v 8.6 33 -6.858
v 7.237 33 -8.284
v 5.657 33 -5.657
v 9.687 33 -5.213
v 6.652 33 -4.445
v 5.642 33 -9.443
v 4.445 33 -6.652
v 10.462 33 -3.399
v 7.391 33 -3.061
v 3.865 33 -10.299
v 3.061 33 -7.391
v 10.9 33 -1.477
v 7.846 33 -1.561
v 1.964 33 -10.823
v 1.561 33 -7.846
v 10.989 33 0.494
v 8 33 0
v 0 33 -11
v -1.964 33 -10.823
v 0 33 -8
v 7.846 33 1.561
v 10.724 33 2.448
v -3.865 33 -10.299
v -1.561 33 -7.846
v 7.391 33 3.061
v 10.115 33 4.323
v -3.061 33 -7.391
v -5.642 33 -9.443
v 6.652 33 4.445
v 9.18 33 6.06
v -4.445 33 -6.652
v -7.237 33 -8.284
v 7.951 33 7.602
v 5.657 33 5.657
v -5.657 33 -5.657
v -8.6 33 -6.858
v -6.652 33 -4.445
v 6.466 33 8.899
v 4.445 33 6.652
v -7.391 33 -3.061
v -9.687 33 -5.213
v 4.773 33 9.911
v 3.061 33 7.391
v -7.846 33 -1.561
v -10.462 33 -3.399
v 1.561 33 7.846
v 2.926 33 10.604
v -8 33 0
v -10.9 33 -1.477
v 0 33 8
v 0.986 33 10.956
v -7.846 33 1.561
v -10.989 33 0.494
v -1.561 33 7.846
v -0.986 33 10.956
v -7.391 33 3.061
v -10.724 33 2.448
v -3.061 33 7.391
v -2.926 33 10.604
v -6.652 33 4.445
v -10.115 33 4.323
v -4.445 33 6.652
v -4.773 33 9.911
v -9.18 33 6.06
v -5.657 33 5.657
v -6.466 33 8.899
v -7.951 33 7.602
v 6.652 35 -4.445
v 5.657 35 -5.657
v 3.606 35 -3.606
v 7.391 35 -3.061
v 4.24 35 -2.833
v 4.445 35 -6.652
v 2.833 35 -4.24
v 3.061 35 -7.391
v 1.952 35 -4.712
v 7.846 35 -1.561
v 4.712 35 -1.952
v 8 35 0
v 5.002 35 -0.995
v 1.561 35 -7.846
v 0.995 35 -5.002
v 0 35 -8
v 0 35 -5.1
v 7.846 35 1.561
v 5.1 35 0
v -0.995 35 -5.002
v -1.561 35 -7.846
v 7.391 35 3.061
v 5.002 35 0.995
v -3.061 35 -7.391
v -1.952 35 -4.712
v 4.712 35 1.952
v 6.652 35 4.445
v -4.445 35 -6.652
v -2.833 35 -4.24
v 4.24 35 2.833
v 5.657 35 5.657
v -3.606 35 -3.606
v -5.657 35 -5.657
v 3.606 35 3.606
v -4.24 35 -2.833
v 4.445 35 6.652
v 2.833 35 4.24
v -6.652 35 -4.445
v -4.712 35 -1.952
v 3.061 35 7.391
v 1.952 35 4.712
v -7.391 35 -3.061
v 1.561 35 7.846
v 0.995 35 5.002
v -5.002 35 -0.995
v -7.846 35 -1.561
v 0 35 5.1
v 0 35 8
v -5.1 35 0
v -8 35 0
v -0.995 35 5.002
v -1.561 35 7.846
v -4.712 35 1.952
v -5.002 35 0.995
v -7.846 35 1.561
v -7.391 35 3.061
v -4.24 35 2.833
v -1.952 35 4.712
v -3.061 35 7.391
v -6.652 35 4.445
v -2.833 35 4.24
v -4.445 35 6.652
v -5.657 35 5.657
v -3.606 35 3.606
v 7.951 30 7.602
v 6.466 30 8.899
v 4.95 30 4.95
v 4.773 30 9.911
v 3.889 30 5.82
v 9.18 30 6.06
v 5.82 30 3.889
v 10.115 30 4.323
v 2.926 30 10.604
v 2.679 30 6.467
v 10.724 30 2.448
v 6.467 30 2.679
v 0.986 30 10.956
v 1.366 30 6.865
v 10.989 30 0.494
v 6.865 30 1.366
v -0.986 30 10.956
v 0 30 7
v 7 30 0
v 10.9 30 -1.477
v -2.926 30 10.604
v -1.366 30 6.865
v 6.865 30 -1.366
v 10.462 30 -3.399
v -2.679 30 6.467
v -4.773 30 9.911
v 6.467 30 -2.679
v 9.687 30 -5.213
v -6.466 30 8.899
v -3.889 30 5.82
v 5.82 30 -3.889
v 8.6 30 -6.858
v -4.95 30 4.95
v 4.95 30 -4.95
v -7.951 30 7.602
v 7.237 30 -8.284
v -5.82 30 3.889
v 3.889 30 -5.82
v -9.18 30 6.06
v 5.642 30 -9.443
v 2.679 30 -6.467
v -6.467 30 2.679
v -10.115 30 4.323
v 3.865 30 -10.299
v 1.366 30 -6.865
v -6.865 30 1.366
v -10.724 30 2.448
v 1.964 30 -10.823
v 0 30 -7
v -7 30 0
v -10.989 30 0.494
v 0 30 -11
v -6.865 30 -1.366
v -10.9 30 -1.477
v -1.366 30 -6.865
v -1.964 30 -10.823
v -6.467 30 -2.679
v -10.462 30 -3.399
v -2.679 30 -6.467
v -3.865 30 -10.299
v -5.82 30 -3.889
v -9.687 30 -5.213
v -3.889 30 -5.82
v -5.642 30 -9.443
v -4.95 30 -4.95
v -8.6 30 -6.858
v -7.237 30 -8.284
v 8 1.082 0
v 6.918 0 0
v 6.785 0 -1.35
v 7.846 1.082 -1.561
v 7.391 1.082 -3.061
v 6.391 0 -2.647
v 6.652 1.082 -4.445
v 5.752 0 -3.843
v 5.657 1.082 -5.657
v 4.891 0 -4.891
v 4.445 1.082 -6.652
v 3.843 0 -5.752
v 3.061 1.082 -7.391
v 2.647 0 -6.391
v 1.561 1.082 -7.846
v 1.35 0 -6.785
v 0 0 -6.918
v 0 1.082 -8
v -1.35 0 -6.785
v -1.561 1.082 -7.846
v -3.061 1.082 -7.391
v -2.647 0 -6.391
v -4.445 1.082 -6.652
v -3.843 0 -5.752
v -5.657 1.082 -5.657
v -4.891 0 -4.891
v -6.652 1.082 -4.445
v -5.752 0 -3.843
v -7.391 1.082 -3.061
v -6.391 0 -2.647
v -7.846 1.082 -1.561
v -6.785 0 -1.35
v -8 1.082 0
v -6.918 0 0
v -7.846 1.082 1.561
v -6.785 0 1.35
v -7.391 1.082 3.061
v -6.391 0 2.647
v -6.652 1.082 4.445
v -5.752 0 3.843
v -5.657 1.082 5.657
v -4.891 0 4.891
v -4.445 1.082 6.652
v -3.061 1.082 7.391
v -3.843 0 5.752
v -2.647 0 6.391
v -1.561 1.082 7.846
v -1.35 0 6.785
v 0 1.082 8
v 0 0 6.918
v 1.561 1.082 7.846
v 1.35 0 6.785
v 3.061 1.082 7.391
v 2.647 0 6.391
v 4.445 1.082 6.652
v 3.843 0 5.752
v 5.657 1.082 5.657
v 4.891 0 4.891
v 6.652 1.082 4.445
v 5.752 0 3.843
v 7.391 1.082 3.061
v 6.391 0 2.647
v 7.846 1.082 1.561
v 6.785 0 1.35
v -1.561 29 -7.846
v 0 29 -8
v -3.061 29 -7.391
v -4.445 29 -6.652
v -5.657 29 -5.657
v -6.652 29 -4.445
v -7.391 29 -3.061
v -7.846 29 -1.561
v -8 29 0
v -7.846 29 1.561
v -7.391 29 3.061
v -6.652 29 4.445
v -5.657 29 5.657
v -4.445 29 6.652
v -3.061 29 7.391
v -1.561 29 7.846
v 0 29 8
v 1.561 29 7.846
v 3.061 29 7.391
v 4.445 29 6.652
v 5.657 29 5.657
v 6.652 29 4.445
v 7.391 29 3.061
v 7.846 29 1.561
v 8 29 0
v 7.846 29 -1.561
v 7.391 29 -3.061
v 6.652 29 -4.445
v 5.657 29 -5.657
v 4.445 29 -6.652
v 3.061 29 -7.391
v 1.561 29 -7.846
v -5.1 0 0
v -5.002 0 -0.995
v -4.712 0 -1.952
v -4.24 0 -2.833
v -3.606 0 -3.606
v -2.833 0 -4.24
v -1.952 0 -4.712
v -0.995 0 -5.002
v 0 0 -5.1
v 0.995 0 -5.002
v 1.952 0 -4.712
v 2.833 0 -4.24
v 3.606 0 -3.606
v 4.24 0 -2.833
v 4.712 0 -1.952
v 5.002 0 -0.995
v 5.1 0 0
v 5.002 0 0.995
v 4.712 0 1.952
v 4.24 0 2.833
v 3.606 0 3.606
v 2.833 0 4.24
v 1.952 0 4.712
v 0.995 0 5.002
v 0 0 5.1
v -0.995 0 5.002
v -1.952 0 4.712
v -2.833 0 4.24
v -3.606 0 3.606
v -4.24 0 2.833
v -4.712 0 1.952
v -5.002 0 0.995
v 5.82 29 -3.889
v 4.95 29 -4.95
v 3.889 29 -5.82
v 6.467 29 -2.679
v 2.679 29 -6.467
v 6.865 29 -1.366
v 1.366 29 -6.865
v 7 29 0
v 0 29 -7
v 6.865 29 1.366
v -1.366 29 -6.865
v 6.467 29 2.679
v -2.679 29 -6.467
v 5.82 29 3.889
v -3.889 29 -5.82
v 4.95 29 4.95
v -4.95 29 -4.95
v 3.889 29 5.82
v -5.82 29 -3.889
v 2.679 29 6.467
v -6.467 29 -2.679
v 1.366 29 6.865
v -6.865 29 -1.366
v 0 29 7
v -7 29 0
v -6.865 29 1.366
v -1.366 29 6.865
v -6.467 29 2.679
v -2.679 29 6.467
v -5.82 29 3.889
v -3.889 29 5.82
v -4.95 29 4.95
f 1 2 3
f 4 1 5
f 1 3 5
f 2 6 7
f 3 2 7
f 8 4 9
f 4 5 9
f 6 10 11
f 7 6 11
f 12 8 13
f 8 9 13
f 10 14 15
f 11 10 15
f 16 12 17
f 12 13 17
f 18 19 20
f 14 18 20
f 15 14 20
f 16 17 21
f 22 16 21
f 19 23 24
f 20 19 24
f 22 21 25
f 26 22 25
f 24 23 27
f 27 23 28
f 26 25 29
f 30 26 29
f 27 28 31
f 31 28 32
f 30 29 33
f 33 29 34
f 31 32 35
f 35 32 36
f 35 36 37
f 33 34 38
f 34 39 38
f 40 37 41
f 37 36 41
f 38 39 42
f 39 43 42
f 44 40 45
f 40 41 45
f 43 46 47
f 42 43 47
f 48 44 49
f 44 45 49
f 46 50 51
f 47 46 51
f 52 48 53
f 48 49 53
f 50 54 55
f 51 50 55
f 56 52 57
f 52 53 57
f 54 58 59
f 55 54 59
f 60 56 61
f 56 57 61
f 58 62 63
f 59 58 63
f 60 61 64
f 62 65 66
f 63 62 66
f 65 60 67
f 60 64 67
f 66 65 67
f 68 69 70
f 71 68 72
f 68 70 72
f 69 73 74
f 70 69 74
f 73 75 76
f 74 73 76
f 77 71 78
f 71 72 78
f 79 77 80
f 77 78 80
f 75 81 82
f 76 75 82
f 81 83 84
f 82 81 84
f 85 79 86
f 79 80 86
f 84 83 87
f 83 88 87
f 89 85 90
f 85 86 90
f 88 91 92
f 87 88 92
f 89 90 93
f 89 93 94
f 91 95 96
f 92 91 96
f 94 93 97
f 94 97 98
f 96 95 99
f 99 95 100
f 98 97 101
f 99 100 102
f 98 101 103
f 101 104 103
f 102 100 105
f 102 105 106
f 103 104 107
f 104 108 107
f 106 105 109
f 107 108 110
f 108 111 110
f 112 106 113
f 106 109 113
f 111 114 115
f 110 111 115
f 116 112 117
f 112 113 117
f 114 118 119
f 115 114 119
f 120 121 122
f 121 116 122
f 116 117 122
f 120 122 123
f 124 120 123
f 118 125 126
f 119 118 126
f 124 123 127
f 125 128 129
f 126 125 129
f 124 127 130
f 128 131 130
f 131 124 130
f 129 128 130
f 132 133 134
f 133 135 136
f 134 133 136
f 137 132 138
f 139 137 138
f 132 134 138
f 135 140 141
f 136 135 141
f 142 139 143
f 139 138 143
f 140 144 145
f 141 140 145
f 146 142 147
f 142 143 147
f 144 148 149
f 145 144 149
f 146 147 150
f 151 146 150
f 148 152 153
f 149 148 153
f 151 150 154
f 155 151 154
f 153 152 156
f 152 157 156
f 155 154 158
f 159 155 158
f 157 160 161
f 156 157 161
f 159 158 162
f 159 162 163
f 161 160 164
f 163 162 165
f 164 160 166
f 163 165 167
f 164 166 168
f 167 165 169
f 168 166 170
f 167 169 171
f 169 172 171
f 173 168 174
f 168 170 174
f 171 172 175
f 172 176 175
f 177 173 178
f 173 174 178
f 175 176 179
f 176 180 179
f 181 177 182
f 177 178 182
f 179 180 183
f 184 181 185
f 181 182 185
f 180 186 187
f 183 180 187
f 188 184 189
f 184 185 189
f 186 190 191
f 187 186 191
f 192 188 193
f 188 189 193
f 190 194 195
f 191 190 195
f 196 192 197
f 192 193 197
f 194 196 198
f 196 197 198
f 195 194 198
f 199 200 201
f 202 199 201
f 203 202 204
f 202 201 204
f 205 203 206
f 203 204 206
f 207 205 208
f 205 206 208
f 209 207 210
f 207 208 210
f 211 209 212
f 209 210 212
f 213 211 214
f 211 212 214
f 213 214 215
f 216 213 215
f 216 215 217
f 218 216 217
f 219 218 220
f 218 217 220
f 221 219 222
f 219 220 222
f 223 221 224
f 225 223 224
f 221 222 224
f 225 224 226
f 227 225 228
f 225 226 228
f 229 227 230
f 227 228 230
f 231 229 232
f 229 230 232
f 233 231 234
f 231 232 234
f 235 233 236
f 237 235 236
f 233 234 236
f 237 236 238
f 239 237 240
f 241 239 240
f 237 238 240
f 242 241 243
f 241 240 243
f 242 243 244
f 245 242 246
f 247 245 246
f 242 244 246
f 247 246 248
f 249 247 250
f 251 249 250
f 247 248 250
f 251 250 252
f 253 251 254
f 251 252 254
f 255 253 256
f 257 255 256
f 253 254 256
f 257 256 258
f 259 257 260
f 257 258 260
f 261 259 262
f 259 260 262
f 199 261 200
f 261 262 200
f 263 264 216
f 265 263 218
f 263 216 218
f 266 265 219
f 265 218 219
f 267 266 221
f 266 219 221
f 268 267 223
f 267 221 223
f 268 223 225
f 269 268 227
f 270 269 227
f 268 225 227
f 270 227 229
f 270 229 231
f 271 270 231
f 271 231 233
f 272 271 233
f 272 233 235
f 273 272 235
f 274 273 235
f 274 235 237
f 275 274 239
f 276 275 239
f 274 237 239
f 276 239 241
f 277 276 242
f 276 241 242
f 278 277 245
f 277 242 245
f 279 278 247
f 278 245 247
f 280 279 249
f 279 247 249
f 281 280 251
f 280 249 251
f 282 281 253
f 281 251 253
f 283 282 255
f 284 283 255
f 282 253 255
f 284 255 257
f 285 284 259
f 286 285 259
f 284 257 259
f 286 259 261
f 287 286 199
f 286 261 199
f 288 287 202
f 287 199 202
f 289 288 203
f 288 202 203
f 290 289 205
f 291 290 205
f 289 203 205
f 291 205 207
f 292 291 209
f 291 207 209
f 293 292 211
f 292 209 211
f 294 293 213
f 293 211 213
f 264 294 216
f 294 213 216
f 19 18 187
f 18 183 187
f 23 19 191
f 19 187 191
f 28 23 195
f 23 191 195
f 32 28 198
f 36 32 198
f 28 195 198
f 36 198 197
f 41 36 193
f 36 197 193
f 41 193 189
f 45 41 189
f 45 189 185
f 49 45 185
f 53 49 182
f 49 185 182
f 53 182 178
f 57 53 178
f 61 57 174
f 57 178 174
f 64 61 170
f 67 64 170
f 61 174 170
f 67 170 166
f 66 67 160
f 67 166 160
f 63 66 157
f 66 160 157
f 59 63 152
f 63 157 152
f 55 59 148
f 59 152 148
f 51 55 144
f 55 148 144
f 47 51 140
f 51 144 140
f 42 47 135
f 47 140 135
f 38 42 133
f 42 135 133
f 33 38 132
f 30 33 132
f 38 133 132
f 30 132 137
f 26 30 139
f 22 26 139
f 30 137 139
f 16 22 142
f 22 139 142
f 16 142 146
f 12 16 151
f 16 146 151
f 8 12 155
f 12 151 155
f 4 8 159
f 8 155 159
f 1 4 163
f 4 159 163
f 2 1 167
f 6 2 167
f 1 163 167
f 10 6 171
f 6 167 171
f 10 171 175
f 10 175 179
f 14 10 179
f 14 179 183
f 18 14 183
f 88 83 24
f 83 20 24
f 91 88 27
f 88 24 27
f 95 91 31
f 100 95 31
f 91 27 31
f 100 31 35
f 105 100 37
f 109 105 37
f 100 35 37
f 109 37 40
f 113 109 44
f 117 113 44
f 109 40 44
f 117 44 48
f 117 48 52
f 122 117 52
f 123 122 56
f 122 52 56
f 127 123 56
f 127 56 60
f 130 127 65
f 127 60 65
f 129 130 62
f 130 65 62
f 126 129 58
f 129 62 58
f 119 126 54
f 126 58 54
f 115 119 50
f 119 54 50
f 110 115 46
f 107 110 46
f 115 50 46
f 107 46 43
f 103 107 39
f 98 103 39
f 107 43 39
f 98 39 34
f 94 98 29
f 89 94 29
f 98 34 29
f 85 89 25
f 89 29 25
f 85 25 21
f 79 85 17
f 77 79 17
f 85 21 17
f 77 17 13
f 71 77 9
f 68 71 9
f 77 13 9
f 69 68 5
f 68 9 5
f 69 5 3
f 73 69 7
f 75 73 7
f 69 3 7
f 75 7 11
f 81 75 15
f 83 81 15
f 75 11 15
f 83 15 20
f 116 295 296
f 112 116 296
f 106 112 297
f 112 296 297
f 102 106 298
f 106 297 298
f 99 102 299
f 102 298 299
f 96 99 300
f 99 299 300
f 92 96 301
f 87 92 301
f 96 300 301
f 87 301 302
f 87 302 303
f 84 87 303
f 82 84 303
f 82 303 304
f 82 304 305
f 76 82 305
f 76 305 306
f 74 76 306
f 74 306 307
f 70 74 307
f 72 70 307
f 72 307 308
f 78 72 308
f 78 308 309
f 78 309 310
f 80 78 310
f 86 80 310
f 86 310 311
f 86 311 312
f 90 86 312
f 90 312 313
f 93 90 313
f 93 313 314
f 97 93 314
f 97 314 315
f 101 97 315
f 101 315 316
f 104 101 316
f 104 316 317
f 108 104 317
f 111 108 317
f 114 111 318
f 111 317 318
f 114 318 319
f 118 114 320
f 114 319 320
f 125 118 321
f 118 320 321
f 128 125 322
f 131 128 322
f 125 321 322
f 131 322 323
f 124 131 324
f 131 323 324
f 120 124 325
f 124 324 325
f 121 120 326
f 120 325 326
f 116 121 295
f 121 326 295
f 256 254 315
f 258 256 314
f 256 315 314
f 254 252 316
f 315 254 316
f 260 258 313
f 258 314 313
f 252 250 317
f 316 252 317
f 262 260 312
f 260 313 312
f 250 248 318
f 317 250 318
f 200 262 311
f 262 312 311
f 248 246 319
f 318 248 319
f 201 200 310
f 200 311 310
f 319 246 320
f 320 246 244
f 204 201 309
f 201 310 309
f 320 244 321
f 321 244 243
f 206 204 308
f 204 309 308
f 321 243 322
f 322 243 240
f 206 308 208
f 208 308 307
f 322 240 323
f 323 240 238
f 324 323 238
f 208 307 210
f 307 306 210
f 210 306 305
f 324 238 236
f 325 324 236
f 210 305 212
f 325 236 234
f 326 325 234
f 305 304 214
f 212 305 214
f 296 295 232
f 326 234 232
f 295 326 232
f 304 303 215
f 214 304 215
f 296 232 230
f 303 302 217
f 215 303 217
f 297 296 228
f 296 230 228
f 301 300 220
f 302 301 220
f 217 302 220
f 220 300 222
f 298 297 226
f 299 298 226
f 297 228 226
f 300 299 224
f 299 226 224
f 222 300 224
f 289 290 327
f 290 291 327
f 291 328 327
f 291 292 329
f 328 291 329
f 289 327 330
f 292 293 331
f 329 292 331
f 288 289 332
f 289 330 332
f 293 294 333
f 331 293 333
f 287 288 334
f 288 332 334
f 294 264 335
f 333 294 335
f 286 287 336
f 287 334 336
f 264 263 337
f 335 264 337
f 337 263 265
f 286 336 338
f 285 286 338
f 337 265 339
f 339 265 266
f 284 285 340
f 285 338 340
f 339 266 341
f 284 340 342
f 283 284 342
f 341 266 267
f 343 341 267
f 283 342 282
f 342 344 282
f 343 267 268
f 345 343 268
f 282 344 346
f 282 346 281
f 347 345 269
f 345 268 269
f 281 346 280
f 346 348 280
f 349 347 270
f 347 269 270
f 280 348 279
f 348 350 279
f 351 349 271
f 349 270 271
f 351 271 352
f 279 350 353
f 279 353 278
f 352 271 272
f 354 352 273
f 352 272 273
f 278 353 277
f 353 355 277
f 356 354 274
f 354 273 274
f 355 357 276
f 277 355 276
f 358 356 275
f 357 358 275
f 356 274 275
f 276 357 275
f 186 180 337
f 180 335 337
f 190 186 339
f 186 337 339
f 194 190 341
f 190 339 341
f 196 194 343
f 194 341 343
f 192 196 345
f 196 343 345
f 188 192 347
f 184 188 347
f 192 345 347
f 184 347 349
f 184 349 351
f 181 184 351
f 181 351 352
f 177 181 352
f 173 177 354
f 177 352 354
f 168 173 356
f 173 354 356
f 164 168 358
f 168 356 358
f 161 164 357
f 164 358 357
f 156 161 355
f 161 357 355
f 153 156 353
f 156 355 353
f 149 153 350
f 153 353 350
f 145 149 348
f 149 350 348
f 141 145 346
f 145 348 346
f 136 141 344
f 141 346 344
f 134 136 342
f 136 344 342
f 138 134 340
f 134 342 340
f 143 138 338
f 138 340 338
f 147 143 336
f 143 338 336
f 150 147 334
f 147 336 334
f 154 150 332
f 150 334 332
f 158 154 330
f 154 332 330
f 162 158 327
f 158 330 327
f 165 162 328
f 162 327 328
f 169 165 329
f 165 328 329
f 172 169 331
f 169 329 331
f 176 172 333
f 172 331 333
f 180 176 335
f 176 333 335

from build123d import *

# Parameters (mm, degrees)
HOLE_WIZARD_M12_1_D = 10.2


# Read off the part's stored shape, not the designer's step: M16 机械螺纹 螺柱1
with BuildPart() as part:
    # 草图1 → 旋转1 (revolve)
    with BuildSketch(Plane.XY, mode=Mode.PRIVATE) as revolve_1_sk:
        Polygon((5, 0), (5, 35), (8, 35), (8, 33), (11, 33), (11, 30), (7, 30), (7, 29), (8, 29), (8, 0), align=None)
    revolve(revolve_1_sk.sketch.rotate(Axis((0, 0, 0), (0, 1, 0)), 90), axis=Axis((0, 0, 0), (0, 1, 0)))

    # M16 机械螺纹 螺柱1 outline → M16 机械螺纹 螺柱1 (revolve, cut)
    with BuildSketch(Plane.XY):
        Polygon((8, 1.0825), (6.9175, 0), (8, 0), align=None)
    revolve(axis=Axis((0, 0, 0), (0, 1, 0)), mode=Mode.SUBTRACT)

    # M12 螺纹孔1 (through all)
    with Locations(Plane(origin=(0, 35, 0), x_dir=(1, 0, 0), z_dir=(0, 1, 0))):
        with Locations((0, 0)):
            Hole(HOLE_WIZARD_M12_1_D / 2)


solid = part.part
